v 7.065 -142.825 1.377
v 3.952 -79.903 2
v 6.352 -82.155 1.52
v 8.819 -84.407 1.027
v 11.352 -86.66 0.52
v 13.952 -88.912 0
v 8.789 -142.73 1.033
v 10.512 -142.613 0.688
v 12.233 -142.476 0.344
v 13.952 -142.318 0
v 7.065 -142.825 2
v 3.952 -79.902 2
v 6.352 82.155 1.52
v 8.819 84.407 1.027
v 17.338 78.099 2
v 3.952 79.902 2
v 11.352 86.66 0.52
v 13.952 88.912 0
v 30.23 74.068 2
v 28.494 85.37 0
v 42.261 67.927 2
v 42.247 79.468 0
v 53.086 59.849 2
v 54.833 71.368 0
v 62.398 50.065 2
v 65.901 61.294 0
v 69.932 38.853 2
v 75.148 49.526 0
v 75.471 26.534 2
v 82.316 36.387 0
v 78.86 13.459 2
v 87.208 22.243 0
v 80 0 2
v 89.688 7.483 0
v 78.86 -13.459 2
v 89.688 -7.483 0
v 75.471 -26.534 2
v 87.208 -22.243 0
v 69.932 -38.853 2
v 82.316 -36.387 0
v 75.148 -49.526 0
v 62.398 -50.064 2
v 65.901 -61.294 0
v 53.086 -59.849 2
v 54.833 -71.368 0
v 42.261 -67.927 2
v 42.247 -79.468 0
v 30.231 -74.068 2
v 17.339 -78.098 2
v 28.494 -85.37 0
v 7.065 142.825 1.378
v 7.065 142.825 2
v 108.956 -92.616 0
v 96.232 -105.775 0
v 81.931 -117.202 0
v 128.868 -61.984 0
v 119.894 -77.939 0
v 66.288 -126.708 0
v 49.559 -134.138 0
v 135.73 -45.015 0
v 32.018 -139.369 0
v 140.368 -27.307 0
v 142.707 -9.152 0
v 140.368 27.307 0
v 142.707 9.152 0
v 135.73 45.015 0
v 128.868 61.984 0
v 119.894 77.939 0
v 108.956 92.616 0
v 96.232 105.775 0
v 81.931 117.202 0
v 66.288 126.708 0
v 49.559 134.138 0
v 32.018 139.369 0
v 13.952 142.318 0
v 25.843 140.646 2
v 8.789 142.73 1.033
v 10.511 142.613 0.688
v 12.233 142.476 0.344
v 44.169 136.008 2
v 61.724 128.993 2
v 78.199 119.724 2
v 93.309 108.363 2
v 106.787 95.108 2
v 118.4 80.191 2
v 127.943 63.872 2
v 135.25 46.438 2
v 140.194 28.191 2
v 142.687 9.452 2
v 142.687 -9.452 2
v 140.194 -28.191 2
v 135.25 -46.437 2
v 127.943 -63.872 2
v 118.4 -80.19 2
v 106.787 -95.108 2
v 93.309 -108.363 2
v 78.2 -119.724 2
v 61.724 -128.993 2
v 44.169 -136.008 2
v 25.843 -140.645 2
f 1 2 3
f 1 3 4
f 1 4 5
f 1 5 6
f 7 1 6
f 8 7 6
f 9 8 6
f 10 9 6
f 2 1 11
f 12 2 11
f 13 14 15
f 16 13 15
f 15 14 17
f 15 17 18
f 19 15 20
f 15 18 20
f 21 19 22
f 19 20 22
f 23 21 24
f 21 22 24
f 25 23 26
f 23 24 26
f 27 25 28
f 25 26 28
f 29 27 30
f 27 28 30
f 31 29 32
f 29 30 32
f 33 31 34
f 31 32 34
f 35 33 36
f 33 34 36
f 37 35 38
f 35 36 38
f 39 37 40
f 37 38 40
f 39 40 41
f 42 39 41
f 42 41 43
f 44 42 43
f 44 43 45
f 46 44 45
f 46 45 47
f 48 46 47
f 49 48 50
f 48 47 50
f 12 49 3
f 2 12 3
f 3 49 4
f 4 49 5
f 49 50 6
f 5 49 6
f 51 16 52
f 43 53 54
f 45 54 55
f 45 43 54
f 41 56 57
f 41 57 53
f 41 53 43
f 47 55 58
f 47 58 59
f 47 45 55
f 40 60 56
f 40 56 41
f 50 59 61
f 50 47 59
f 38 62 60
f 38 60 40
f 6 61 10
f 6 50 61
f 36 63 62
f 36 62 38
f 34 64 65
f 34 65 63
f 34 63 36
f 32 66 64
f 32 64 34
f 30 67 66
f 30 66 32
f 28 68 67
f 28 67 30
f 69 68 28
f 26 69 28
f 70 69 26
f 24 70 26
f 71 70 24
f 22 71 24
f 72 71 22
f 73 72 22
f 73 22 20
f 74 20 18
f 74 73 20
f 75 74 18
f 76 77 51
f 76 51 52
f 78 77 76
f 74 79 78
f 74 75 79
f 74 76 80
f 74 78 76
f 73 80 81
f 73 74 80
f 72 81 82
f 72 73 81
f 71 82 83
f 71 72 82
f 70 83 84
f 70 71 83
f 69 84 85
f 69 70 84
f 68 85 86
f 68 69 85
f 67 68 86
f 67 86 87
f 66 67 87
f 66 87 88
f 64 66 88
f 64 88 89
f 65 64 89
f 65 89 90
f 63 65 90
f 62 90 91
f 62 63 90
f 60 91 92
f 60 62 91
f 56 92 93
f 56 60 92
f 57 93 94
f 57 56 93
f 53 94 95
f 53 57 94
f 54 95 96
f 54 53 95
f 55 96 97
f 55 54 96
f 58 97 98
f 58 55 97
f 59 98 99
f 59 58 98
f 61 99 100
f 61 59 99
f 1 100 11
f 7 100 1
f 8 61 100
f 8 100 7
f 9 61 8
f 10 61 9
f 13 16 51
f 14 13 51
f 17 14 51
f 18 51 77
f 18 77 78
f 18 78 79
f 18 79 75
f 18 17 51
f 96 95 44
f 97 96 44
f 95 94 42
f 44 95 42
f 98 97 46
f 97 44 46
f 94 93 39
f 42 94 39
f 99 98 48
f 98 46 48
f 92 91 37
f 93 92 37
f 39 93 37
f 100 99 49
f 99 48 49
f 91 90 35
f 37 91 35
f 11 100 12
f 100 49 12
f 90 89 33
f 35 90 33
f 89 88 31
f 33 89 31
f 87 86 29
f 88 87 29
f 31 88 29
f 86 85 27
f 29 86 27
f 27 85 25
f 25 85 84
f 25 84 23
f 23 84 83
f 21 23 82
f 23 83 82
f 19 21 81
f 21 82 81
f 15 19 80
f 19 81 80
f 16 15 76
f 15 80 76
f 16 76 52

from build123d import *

# Parameters (mm, degrees)
BOSS_EXTRUDE1_DEPTH     = 2
CUT_EXTRUDE1_DEPTH      = 203.119002293
CUT_EXTRUDE1_DEPTH_BACK = 203.119002293
SKETCH2_R               = 80
CUT_EXTRUDE2_DEPTH      = 203.119002293
CUT_EXTRUDE2_DEPTH_BACK = 203.119002293


with BuildPart() as part:
    # Sketch1 → Boss-Extrude1 (new body)
    with BuildSketch(Plane.XY):
        with BuildLine():
            Line((0, 0), (7.064623984, 142.825386707))
            ThreePointArc((7.064623984, 142.825386707), (143, 0.000219219), (7.065061887, -142.825365046))
            Line((7.065061887, -142.825365046), (0, 0))
        make_face()
    extrude(amount=BOSS_EXTRUDE1_DEPTH)

    # Sketch2 → Cut-Extrude1 (cut, two sides: drawn at the far end of the back side and taken through both)
    with BuildSketch(Plane(origin=(0, 0, 0), x_dir=(-1, 0, 0), z_dir=(0, 0, -1)).offset(-CUT_EXTRUDE1_DEPTH_BACK)):
        Circle(SKETCH2_R)
    extrude(amount=CUT_EXTRUDE1_DEPTH + CUT_EXTRUDE1_DEPTH_BACK, mode=Mode.SUBTRACT)

    # Sketch3 → Cut-Extrude2 (cut, two sides: drawn at the far end of the back side and taken through both)
    with BuildSketch(Plane(origin=(0, 0, 0), x_dir=(1, 0, 0), z_dir=(0, 1, 0)).offset(-CUT_EXTRUDE2_DEPTH_BACK)):
        Polygon((3.952237194, -2), (13.952237194, 0), (3.952237194, 0), align=None)
    extrude(amount=CUT_EXTRUDE2_DEPTH + CUT_EXTRUDE2_DEPTH_BACK, mode=Mode.SUBTRACT)

    # Sketch5 → Cut-Revolve1 (revolve, cut)
    with BuildSketch(Plane(origin=(0, 0, 0), x_dir=(1, 0, 0), z_dir=(0, 1, 0))):
        Polygon((80, -2), (90, 0), (80, 0), align=None)
    revolve(axis=Axis((0, 0, 0), (0, 0, -1)), mode=Mode.SUBTRACT)


solid = part.part
